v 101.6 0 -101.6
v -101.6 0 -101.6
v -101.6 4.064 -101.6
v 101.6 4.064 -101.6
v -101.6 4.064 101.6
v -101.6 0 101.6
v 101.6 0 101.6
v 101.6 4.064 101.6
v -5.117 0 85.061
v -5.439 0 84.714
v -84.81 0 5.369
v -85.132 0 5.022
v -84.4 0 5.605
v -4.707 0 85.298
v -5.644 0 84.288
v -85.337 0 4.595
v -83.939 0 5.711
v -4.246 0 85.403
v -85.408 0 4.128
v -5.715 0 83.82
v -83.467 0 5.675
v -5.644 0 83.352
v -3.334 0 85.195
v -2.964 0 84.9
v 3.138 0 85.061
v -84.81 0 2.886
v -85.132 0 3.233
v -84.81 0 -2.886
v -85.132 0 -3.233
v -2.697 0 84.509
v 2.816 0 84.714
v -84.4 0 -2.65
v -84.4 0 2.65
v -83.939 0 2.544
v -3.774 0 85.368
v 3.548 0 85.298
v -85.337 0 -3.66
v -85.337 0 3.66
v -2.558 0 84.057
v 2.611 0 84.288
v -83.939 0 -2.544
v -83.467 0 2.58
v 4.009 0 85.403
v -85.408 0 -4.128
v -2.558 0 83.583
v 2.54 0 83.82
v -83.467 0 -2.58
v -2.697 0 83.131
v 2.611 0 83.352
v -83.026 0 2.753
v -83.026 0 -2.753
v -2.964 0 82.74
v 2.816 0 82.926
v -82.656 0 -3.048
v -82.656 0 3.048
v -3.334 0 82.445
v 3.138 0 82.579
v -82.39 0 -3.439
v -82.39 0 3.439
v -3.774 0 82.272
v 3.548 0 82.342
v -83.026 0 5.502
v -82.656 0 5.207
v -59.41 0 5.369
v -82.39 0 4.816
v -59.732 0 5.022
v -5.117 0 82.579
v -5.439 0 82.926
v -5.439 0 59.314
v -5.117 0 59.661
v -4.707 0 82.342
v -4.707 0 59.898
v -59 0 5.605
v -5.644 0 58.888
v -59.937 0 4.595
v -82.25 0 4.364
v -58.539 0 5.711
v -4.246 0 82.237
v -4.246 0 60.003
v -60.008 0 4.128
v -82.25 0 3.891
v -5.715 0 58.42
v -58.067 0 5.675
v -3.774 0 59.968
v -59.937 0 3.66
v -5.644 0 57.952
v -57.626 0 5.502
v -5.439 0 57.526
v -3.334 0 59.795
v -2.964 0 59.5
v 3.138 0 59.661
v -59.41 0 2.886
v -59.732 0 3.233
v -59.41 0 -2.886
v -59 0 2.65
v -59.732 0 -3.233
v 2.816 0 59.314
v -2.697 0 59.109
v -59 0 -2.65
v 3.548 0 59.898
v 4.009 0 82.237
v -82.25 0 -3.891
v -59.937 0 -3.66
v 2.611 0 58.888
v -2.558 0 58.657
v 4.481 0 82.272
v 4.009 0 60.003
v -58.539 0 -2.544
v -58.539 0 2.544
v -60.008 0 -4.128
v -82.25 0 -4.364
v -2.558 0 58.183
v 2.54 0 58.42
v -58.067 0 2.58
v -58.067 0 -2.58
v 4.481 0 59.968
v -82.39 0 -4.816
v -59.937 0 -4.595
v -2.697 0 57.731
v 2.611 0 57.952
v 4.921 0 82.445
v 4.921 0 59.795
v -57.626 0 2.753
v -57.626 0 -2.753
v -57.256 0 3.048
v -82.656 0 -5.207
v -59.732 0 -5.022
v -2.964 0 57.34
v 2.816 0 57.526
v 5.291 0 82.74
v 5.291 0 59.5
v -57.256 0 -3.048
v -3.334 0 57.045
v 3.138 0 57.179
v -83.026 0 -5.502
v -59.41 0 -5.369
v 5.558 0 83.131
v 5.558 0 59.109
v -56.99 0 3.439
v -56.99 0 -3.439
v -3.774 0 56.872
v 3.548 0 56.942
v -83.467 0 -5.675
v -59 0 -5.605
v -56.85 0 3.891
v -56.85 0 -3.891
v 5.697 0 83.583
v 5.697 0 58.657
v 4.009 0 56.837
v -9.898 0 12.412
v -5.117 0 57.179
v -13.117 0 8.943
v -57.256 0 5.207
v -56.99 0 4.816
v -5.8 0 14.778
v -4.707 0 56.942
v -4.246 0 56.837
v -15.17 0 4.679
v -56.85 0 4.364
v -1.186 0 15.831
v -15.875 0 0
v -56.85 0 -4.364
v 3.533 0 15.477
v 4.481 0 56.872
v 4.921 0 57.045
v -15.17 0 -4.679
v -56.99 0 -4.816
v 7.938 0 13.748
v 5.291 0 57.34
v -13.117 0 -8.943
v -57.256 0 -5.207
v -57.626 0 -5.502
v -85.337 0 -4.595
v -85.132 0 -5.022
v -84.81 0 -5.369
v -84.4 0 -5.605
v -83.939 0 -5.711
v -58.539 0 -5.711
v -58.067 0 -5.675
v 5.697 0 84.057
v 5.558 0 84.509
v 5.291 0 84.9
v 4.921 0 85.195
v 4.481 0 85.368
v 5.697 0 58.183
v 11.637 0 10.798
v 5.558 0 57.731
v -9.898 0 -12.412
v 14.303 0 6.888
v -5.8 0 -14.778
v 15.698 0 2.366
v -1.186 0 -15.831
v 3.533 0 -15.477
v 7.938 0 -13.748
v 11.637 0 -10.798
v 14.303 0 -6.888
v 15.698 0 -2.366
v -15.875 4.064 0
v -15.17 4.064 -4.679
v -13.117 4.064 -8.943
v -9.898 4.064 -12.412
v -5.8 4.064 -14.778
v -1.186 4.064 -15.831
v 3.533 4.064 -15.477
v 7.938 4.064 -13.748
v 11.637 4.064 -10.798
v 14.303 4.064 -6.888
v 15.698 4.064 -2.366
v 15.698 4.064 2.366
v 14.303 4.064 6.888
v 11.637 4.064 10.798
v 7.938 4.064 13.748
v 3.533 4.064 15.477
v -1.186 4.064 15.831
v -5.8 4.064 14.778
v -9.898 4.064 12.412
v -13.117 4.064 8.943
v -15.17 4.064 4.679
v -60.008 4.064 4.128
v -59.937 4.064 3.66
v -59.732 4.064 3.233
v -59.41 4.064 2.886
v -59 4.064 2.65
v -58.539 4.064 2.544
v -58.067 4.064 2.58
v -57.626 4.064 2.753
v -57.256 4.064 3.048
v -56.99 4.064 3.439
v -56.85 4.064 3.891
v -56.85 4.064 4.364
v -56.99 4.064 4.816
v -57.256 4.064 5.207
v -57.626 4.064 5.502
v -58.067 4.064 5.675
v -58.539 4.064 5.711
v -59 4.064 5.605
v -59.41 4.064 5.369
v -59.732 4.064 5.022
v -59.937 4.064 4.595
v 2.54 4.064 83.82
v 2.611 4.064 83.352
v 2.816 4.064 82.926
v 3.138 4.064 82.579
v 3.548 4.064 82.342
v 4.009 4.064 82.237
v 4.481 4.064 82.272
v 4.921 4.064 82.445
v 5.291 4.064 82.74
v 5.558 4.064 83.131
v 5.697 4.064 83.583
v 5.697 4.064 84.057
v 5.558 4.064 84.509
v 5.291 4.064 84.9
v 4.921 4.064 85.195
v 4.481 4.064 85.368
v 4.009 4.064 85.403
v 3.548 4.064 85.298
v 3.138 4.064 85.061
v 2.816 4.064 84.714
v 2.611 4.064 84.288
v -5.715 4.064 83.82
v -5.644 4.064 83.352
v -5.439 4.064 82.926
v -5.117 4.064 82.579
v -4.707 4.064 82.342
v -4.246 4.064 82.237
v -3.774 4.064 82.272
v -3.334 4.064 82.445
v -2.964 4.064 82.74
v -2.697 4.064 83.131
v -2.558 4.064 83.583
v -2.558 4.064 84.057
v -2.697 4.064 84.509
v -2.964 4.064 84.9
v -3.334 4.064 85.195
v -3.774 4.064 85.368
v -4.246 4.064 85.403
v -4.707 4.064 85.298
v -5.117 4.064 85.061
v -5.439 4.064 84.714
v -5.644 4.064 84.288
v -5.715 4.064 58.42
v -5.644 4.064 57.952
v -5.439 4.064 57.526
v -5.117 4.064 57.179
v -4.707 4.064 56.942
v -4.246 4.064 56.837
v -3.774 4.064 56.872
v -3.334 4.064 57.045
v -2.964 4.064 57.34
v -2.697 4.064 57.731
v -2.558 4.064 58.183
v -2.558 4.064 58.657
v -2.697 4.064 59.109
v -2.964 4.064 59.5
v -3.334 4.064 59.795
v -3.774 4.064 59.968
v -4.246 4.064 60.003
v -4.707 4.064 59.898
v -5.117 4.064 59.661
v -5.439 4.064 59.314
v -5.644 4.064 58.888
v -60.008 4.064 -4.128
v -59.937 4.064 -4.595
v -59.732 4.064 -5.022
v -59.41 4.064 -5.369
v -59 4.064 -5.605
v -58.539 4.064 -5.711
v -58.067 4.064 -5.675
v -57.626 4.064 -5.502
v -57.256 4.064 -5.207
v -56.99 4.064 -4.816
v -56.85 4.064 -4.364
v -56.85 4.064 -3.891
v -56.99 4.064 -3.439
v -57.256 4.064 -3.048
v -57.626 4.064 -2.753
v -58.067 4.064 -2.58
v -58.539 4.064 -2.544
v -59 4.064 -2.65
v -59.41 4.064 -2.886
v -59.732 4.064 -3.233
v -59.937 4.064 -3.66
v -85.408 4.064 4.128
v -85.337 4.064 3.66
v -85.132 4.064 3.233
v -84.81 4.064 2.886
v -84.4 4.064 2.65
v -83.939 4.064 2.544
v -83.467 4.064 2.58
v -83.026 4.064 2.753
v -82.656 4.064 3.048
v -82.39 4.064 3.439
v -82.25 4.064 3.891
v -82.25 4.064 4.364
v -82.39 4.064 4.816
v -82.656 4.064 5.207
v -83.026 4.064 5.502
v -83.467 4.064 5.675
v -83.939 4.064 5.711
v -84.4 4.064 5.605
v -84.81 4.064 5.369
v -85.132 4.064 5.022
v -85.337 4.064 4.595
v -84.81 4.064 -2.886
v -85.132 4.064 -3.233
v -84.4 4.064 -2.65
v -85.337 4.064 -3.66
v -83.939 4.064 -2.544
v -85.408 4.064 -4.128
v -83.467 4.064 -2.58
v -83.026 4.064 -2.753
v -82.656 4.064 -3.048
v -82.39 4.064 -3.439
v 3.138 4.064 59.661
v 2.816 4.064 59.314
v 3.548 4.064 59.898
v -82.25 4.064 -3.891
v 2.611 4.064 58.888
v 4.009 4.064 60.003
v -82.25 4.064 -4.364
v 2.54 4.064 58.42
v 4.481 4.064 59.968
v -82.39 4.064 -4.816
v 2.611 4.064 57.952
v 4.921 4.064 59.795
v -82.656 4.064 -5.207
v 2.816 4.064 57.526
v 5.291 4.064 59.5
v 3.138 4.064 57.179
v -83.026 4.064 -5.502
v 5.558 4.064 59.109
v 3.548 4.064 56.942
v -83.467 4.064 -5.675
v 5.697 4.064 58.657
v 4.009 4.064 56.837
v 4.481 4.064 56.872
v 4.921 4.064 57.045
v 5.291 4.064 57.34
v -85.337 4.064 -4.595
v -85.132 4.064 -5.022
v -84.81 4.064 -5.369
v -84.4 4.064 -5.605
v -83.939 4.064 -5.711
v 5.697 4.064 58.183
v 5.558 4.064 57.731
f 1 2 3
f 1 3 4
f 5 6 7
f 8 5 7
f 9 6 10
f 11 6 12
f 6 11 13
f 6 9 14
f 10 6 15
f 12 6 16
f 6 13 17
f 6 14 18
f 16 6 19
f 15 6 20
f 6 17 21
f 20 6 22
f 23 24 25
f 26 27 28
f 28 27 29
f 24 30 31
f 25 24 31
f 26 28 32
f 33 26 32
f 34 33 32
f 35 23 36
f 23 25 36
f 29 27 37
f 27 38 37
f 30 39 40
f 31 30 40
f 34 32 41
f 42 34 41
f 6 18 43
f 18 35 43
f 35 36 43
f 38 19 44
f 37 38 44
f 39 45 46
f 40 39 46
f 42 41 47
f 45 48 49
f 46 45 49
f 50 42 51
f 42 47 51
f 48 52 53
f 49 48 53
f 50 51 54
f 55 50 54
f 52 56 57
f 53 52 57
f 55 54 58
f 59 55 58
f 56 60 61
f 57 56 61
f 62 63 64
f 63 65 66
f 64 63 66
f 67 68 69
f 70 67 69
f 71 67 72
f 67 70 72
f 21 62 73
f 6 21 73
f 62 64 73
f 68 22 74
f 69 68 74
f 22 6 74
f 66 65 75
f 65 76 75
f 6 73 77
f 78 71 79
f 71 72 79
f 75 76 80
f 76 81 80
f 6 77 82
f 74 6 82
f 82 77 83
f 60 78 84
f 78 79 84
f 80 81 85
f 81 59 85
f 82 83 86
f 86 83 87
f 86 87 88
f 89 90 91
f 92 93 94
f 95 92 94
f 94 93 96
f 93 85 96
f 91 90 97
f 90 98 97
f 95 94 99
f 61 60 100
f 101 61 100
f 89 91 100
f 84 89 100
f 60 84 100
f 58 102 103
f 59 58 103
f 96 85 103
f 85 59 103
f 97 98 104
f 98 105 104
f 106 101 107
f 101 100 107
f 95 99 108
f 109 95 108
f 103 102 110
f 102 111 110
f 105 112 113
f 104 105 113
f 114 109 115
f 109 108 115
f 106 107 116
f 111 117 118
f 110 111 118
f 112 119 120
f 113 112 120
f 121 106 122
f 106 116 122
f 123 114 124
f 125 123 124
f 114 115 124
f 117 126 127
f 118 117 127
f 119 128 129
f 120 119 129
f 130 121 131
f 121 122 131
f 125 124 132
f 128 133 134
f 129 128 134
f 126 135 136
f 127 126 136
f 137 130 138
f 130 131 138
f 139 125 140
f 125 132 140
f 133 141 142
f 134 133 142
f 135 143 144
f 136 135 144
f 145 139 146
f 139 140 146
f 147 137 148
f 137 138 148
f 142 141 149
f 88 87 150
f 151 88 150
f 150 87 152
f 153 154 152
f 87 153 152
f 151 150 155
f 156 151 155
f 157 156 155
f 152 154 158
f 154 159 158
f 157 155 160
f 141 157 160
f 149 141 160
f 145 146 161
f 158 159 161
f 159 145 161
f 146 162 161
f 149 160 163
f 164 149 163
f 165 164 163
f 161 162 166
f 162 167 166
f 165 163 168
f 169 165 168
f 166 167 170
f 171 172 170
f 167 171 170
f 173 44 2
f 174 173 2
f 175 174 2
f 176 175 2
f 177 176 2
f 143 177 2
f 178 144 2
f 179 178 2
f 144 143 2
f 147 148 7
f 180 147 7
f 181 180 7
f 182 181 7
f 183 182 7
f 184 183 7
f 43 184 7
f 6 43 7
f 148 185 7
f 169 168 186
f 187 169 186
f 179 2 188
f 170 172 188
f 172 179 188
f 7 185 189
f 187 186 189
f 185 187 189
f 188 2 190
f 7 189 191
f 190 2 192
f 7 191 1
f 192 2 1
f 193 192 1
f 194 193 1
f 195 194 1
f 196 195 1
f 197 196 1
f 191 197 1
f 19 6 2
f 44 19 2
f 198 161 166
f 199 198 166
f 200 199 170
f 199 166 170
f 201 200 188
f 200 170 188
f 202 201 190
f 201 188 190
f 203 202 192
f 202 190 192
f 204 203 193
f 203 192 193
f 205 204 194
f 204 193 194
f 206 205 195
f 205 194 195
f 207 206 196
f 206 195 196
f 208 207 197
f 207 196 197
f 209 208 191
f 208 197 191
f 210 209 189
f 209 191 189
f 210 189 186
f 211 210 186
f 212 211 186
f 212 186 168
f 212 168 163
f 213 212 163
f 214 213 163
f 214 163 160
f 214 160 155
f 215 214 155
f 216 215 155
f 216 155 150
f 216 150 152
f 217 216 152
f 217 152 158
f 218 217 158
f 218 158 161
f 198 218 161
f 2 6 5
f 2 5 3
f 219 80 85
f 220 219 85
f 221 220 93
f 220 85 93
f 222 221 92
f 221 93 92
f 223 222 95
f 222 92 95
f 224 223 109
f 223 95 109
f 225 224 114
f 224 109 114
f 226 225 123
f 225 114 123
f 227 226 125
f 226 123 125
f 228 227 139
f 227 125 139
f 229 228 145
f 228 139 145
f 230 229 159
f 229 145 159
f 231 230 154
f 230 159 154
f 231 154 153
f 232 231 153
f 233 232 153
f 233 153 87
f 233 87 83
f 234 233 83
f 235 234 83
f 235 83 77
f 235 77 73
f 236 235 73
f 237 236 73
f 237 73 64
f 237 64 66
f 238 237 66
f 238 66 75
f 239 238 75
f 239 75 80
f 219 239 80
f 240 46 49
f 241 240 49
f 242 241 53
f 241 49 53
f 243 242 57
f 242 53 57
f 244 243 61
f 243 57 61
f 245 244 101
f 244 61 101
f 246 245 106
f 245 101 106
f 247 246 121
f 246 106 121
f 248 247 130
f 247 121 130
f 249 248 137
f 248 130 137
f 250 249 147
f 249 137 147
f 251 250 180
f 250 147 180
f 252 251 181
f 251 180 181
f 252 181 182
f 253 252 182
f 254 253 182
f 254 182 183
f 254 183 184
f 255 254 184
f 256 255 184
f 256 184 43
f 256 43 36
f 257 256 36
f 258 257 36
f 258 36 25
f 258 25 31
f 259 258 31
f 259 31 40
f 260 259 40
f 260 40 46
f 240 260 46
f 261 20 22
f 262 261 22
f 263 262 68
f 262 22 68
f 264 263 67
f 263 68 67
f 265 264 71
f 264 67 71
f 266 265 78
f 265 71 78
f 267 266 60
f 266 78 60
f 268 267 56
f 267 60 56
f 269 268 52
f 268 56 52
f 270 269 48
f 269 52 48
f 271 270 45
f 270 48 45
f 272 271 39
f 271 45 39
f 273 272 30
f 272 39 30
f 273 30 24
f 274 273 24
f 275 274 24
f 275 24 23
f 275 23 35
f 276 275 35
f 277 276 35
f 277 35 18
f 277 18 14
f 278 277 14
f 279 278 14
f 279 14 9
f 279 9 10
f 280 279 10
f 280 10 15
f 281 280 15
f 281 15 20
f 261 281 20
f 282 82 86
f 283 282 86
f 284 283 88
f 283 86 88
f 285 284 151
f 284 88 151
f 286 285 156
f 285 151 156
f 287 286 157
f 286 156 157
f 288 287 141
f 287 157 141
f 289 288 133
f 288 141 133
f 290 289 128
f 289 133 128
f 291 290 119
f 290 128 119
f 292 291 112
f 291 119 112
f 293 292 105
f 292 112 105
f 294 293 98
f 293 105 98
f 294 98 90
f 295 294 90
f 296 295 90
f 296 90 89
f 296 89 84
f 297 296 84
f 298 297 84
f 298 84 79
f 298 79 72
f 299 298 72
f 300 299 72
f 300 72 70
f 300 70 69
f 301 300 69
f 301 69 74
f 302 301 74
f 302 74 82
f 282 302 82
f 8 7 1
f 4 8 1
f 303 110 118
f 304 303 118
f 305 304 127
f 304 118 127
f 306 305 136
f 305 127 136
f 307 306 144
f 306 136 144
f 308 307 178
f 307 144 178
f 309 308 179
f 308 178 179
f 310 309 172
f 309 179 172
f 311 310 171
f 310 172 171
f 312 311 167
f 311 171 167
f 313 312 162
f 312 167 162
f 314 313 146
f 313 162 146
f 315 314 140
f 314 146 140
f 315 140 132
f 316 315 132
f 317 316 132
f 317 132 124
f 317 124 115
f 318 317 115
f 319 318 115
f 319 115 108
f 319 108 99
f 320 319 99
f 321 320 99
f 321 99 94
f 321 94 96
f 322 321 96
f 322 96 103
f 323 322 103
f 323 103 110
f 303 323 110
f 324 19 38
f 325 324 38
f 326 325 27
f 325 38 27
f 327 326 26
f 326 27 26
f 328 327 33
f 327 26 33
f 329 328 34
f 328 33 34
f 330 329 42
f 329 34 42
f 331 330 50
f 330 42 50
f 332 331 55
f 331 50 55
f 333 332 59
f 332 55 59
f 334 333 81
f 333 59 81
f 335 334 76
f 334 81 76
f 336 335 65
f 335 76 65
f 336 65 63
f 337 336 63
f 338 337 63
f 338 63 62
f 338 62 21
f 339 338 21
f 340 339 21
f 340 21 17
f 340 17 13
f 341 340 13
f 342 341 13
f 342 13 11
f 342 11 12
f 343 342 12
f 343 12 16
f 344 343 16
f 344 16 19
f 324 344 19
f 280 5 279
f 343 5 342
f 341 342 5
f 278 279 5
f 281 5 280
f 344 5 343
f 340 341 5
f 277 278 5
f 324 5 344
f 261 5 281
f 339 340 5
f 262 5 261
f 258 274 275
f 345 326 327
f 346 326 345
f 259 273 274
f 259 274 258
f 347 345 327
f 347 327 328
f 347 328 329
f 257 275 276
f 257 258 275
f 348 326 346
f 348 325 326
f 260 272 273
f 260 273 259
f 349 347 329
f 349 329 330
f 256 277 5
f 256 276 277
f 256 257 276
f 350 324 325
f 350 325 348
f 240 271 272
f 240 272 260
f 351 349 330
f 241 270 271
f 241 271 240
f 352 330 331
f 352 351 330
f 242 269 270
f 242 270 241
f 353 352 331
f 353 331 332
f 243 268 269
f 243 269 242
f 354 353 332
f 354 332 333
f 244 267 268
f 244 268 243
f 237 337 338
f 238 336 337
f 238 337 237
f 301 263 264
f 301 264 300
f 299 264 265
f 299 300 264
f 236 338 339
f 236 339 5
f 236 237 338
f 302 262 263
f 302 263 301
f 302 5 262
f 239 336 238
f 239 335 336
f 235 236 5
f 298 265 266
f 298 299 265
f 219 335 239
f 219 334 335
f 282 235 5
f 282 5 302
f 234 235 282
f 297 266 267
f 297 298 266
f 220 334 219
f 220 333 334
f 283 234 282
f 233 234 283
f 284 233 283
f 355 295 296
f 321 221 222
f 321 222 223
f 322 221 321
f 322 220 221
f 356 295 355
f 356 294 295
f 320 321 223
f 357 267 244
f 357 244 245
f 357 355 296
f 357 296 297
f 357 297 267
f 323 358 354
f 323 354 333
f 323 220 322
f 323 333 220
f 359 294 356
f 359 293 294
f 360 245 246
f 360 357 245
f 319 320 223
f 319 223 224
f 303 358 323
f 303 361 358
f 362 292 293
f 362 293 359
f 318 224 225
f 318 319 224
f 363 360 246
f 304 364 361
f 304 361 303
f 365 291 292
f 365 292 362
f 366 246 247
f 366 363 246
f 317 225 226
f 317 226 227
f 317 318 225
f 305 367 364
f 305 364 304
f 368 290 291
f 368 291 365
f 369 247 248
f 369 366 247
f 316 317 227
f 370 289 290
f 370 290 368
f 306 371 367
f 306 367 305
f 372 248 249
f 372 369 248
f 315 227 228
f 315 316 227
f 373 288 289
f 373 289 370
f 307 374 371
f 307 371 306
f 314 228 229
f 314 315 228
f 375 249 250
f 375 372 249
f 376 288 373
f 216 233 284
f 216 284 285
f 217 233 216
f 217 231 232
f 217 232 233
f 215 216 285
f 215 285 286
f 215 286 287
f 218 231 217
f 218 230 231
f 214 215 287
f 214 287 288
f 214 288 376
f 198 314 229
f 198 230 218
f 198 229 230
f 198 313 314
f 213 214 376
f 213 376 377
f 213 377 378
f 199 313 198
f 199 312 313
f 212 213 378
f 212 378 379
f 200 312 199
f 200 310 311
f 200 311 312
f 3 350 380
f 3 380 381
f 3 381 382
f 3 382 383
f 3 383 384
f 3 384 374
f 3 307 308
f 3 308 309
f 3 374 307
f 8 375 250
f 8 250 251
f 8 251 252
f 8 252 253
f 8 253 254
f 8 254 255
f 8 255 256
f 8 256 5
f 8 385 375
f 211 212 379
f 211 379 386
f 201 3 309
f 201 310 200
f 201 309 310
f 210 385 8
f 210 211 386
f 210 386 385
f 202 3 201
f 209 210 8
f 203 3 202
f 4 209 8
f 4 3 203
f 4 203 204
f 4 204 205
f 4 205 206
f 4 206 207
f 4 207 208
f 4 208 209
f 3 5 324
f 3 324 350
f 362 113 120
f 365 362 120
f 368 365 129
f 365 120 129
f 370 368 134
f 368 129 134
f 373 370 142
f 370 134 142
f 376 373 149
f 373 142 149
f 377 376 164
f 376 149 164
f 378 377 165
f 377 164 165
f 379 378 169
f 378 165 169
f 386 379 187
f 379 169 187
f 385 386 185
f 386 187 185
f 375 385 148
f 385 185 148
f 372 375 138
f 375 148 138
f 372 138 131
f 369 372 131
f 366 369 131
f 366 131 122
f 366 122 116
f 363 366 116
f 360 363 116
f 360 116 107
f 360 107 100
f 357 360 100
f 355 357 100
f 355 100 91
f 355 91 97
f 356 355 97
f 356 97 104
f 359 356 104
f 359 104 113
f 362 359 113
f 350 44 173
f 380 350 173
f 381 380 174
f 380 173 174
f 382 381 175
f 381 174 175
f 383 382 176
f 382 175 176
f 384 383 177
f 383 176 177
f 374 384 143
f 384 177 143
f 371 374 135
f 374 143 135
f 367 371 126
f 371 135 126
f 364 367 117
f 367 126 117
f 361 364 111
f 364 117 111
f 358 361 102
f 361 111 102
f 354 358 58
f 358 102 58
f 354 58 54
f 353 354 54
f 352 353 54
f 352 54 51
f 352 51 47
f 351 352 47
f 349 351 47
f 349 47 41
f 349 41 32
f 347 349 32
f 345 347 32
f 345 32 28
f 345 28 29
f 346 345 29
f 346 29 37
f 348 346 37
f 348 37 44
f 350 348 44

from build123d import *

# Parameters (mm, degrees)
SKETCH1_W                        = 203.2
SKETCH1_H                        = 203.2
BOSS_EXTRUDE1_DEPTH              = 4.064
F_1_8_0_125_DIAMETER_HOLE1_D     = 3.175
F_1_8_0_125_DIAMETER_HOLE1_DEPTH = 25.4
F_1_8_0_125_DIAMETER_HOLE1_TIP   = 0.953866233
F_5_8_0_625_DIAMETER_HOLE1_D     = 31.75
F_5_8_0_625_DIAMETER_HOLE1_DEPTH = 25.4
F_5_8_0_625_DIAMETER_HOLE1_TIP   = 9.538662327


with BuildPart() as part:
    # Sketch1 → Boss-Extrude1 (new body)
    with BuildSketch(Plane(origin=(0, 0, 0), x_dir=(1, 0, 0), z_dir=(0, 1, 0))):
        Rectangle(SKETCH1_W, SKETCH1_H)
    extrude(amount=BOSS_EXTRUDE1_DEPTH)

    # 1/8 (0.125) Diameter Hole1
    with Locations(Plane(origin=(0, 4.064, 0), x_dir=(1, 0, 0), z_dir=(0, 1, 0))):
        with Locations((-83.82, 4.1275), (-58.42, 4.1275), (-58.42, -4.1275), (-83.82, -4.1275), (-4.1275, -83.82), (-4.1275, -58.42), (4.1275, -58.42), (4.1275, -83.82)):
            Hole(F_1_8_0_125_DIAMETER_HOLE1_D / 2, depth=F_1_8_0_125_DIAMETER_HOLE1_DEPTH)
            with Locations((0, 0, -(F_1_8_0_125_DIAMETER_HOLE1_DEPTH + F_1_8_0_125_DIAMETER_HOLE1_TIP / 2))):  # 118° drill point
                Cone(0, F_1_8_0_125_DIAMETER_HOLE1_D / 2, F_1_8_0_125_DIAMETER_HOLE1_TIP, mode=Mode.SUBTRACT)

    # 5/8 (0.625) Diameter Hole1
    with Locations(Plane(origin=(0, 4.064, 0), x_dir=(1, 0, 0), z_dir=(0, 1, 0))):
        with Locations((0, 0)):
            Hole(F_5_8_0_625_DIAMETER_HOLE1_D / 2, depth=F_5_8_0_625_DIAMETER_HOLE1_DEPTH)
            with Locations((0, 0, -(F_5_8_0_625_DIAMETER_HOLE1_DEPTH + F_5_8_0_625_DIAMETER_HOLE1_TIP / 2))):  # 118° drill point
                Cone(0, F_5_8_0_625_DIAMETER_HOLE1_D / 2, F_5_8_0_625_DIAMETER_HOLE1_TIP, mode=Mode.SUBTRACT)


solid = part.part
